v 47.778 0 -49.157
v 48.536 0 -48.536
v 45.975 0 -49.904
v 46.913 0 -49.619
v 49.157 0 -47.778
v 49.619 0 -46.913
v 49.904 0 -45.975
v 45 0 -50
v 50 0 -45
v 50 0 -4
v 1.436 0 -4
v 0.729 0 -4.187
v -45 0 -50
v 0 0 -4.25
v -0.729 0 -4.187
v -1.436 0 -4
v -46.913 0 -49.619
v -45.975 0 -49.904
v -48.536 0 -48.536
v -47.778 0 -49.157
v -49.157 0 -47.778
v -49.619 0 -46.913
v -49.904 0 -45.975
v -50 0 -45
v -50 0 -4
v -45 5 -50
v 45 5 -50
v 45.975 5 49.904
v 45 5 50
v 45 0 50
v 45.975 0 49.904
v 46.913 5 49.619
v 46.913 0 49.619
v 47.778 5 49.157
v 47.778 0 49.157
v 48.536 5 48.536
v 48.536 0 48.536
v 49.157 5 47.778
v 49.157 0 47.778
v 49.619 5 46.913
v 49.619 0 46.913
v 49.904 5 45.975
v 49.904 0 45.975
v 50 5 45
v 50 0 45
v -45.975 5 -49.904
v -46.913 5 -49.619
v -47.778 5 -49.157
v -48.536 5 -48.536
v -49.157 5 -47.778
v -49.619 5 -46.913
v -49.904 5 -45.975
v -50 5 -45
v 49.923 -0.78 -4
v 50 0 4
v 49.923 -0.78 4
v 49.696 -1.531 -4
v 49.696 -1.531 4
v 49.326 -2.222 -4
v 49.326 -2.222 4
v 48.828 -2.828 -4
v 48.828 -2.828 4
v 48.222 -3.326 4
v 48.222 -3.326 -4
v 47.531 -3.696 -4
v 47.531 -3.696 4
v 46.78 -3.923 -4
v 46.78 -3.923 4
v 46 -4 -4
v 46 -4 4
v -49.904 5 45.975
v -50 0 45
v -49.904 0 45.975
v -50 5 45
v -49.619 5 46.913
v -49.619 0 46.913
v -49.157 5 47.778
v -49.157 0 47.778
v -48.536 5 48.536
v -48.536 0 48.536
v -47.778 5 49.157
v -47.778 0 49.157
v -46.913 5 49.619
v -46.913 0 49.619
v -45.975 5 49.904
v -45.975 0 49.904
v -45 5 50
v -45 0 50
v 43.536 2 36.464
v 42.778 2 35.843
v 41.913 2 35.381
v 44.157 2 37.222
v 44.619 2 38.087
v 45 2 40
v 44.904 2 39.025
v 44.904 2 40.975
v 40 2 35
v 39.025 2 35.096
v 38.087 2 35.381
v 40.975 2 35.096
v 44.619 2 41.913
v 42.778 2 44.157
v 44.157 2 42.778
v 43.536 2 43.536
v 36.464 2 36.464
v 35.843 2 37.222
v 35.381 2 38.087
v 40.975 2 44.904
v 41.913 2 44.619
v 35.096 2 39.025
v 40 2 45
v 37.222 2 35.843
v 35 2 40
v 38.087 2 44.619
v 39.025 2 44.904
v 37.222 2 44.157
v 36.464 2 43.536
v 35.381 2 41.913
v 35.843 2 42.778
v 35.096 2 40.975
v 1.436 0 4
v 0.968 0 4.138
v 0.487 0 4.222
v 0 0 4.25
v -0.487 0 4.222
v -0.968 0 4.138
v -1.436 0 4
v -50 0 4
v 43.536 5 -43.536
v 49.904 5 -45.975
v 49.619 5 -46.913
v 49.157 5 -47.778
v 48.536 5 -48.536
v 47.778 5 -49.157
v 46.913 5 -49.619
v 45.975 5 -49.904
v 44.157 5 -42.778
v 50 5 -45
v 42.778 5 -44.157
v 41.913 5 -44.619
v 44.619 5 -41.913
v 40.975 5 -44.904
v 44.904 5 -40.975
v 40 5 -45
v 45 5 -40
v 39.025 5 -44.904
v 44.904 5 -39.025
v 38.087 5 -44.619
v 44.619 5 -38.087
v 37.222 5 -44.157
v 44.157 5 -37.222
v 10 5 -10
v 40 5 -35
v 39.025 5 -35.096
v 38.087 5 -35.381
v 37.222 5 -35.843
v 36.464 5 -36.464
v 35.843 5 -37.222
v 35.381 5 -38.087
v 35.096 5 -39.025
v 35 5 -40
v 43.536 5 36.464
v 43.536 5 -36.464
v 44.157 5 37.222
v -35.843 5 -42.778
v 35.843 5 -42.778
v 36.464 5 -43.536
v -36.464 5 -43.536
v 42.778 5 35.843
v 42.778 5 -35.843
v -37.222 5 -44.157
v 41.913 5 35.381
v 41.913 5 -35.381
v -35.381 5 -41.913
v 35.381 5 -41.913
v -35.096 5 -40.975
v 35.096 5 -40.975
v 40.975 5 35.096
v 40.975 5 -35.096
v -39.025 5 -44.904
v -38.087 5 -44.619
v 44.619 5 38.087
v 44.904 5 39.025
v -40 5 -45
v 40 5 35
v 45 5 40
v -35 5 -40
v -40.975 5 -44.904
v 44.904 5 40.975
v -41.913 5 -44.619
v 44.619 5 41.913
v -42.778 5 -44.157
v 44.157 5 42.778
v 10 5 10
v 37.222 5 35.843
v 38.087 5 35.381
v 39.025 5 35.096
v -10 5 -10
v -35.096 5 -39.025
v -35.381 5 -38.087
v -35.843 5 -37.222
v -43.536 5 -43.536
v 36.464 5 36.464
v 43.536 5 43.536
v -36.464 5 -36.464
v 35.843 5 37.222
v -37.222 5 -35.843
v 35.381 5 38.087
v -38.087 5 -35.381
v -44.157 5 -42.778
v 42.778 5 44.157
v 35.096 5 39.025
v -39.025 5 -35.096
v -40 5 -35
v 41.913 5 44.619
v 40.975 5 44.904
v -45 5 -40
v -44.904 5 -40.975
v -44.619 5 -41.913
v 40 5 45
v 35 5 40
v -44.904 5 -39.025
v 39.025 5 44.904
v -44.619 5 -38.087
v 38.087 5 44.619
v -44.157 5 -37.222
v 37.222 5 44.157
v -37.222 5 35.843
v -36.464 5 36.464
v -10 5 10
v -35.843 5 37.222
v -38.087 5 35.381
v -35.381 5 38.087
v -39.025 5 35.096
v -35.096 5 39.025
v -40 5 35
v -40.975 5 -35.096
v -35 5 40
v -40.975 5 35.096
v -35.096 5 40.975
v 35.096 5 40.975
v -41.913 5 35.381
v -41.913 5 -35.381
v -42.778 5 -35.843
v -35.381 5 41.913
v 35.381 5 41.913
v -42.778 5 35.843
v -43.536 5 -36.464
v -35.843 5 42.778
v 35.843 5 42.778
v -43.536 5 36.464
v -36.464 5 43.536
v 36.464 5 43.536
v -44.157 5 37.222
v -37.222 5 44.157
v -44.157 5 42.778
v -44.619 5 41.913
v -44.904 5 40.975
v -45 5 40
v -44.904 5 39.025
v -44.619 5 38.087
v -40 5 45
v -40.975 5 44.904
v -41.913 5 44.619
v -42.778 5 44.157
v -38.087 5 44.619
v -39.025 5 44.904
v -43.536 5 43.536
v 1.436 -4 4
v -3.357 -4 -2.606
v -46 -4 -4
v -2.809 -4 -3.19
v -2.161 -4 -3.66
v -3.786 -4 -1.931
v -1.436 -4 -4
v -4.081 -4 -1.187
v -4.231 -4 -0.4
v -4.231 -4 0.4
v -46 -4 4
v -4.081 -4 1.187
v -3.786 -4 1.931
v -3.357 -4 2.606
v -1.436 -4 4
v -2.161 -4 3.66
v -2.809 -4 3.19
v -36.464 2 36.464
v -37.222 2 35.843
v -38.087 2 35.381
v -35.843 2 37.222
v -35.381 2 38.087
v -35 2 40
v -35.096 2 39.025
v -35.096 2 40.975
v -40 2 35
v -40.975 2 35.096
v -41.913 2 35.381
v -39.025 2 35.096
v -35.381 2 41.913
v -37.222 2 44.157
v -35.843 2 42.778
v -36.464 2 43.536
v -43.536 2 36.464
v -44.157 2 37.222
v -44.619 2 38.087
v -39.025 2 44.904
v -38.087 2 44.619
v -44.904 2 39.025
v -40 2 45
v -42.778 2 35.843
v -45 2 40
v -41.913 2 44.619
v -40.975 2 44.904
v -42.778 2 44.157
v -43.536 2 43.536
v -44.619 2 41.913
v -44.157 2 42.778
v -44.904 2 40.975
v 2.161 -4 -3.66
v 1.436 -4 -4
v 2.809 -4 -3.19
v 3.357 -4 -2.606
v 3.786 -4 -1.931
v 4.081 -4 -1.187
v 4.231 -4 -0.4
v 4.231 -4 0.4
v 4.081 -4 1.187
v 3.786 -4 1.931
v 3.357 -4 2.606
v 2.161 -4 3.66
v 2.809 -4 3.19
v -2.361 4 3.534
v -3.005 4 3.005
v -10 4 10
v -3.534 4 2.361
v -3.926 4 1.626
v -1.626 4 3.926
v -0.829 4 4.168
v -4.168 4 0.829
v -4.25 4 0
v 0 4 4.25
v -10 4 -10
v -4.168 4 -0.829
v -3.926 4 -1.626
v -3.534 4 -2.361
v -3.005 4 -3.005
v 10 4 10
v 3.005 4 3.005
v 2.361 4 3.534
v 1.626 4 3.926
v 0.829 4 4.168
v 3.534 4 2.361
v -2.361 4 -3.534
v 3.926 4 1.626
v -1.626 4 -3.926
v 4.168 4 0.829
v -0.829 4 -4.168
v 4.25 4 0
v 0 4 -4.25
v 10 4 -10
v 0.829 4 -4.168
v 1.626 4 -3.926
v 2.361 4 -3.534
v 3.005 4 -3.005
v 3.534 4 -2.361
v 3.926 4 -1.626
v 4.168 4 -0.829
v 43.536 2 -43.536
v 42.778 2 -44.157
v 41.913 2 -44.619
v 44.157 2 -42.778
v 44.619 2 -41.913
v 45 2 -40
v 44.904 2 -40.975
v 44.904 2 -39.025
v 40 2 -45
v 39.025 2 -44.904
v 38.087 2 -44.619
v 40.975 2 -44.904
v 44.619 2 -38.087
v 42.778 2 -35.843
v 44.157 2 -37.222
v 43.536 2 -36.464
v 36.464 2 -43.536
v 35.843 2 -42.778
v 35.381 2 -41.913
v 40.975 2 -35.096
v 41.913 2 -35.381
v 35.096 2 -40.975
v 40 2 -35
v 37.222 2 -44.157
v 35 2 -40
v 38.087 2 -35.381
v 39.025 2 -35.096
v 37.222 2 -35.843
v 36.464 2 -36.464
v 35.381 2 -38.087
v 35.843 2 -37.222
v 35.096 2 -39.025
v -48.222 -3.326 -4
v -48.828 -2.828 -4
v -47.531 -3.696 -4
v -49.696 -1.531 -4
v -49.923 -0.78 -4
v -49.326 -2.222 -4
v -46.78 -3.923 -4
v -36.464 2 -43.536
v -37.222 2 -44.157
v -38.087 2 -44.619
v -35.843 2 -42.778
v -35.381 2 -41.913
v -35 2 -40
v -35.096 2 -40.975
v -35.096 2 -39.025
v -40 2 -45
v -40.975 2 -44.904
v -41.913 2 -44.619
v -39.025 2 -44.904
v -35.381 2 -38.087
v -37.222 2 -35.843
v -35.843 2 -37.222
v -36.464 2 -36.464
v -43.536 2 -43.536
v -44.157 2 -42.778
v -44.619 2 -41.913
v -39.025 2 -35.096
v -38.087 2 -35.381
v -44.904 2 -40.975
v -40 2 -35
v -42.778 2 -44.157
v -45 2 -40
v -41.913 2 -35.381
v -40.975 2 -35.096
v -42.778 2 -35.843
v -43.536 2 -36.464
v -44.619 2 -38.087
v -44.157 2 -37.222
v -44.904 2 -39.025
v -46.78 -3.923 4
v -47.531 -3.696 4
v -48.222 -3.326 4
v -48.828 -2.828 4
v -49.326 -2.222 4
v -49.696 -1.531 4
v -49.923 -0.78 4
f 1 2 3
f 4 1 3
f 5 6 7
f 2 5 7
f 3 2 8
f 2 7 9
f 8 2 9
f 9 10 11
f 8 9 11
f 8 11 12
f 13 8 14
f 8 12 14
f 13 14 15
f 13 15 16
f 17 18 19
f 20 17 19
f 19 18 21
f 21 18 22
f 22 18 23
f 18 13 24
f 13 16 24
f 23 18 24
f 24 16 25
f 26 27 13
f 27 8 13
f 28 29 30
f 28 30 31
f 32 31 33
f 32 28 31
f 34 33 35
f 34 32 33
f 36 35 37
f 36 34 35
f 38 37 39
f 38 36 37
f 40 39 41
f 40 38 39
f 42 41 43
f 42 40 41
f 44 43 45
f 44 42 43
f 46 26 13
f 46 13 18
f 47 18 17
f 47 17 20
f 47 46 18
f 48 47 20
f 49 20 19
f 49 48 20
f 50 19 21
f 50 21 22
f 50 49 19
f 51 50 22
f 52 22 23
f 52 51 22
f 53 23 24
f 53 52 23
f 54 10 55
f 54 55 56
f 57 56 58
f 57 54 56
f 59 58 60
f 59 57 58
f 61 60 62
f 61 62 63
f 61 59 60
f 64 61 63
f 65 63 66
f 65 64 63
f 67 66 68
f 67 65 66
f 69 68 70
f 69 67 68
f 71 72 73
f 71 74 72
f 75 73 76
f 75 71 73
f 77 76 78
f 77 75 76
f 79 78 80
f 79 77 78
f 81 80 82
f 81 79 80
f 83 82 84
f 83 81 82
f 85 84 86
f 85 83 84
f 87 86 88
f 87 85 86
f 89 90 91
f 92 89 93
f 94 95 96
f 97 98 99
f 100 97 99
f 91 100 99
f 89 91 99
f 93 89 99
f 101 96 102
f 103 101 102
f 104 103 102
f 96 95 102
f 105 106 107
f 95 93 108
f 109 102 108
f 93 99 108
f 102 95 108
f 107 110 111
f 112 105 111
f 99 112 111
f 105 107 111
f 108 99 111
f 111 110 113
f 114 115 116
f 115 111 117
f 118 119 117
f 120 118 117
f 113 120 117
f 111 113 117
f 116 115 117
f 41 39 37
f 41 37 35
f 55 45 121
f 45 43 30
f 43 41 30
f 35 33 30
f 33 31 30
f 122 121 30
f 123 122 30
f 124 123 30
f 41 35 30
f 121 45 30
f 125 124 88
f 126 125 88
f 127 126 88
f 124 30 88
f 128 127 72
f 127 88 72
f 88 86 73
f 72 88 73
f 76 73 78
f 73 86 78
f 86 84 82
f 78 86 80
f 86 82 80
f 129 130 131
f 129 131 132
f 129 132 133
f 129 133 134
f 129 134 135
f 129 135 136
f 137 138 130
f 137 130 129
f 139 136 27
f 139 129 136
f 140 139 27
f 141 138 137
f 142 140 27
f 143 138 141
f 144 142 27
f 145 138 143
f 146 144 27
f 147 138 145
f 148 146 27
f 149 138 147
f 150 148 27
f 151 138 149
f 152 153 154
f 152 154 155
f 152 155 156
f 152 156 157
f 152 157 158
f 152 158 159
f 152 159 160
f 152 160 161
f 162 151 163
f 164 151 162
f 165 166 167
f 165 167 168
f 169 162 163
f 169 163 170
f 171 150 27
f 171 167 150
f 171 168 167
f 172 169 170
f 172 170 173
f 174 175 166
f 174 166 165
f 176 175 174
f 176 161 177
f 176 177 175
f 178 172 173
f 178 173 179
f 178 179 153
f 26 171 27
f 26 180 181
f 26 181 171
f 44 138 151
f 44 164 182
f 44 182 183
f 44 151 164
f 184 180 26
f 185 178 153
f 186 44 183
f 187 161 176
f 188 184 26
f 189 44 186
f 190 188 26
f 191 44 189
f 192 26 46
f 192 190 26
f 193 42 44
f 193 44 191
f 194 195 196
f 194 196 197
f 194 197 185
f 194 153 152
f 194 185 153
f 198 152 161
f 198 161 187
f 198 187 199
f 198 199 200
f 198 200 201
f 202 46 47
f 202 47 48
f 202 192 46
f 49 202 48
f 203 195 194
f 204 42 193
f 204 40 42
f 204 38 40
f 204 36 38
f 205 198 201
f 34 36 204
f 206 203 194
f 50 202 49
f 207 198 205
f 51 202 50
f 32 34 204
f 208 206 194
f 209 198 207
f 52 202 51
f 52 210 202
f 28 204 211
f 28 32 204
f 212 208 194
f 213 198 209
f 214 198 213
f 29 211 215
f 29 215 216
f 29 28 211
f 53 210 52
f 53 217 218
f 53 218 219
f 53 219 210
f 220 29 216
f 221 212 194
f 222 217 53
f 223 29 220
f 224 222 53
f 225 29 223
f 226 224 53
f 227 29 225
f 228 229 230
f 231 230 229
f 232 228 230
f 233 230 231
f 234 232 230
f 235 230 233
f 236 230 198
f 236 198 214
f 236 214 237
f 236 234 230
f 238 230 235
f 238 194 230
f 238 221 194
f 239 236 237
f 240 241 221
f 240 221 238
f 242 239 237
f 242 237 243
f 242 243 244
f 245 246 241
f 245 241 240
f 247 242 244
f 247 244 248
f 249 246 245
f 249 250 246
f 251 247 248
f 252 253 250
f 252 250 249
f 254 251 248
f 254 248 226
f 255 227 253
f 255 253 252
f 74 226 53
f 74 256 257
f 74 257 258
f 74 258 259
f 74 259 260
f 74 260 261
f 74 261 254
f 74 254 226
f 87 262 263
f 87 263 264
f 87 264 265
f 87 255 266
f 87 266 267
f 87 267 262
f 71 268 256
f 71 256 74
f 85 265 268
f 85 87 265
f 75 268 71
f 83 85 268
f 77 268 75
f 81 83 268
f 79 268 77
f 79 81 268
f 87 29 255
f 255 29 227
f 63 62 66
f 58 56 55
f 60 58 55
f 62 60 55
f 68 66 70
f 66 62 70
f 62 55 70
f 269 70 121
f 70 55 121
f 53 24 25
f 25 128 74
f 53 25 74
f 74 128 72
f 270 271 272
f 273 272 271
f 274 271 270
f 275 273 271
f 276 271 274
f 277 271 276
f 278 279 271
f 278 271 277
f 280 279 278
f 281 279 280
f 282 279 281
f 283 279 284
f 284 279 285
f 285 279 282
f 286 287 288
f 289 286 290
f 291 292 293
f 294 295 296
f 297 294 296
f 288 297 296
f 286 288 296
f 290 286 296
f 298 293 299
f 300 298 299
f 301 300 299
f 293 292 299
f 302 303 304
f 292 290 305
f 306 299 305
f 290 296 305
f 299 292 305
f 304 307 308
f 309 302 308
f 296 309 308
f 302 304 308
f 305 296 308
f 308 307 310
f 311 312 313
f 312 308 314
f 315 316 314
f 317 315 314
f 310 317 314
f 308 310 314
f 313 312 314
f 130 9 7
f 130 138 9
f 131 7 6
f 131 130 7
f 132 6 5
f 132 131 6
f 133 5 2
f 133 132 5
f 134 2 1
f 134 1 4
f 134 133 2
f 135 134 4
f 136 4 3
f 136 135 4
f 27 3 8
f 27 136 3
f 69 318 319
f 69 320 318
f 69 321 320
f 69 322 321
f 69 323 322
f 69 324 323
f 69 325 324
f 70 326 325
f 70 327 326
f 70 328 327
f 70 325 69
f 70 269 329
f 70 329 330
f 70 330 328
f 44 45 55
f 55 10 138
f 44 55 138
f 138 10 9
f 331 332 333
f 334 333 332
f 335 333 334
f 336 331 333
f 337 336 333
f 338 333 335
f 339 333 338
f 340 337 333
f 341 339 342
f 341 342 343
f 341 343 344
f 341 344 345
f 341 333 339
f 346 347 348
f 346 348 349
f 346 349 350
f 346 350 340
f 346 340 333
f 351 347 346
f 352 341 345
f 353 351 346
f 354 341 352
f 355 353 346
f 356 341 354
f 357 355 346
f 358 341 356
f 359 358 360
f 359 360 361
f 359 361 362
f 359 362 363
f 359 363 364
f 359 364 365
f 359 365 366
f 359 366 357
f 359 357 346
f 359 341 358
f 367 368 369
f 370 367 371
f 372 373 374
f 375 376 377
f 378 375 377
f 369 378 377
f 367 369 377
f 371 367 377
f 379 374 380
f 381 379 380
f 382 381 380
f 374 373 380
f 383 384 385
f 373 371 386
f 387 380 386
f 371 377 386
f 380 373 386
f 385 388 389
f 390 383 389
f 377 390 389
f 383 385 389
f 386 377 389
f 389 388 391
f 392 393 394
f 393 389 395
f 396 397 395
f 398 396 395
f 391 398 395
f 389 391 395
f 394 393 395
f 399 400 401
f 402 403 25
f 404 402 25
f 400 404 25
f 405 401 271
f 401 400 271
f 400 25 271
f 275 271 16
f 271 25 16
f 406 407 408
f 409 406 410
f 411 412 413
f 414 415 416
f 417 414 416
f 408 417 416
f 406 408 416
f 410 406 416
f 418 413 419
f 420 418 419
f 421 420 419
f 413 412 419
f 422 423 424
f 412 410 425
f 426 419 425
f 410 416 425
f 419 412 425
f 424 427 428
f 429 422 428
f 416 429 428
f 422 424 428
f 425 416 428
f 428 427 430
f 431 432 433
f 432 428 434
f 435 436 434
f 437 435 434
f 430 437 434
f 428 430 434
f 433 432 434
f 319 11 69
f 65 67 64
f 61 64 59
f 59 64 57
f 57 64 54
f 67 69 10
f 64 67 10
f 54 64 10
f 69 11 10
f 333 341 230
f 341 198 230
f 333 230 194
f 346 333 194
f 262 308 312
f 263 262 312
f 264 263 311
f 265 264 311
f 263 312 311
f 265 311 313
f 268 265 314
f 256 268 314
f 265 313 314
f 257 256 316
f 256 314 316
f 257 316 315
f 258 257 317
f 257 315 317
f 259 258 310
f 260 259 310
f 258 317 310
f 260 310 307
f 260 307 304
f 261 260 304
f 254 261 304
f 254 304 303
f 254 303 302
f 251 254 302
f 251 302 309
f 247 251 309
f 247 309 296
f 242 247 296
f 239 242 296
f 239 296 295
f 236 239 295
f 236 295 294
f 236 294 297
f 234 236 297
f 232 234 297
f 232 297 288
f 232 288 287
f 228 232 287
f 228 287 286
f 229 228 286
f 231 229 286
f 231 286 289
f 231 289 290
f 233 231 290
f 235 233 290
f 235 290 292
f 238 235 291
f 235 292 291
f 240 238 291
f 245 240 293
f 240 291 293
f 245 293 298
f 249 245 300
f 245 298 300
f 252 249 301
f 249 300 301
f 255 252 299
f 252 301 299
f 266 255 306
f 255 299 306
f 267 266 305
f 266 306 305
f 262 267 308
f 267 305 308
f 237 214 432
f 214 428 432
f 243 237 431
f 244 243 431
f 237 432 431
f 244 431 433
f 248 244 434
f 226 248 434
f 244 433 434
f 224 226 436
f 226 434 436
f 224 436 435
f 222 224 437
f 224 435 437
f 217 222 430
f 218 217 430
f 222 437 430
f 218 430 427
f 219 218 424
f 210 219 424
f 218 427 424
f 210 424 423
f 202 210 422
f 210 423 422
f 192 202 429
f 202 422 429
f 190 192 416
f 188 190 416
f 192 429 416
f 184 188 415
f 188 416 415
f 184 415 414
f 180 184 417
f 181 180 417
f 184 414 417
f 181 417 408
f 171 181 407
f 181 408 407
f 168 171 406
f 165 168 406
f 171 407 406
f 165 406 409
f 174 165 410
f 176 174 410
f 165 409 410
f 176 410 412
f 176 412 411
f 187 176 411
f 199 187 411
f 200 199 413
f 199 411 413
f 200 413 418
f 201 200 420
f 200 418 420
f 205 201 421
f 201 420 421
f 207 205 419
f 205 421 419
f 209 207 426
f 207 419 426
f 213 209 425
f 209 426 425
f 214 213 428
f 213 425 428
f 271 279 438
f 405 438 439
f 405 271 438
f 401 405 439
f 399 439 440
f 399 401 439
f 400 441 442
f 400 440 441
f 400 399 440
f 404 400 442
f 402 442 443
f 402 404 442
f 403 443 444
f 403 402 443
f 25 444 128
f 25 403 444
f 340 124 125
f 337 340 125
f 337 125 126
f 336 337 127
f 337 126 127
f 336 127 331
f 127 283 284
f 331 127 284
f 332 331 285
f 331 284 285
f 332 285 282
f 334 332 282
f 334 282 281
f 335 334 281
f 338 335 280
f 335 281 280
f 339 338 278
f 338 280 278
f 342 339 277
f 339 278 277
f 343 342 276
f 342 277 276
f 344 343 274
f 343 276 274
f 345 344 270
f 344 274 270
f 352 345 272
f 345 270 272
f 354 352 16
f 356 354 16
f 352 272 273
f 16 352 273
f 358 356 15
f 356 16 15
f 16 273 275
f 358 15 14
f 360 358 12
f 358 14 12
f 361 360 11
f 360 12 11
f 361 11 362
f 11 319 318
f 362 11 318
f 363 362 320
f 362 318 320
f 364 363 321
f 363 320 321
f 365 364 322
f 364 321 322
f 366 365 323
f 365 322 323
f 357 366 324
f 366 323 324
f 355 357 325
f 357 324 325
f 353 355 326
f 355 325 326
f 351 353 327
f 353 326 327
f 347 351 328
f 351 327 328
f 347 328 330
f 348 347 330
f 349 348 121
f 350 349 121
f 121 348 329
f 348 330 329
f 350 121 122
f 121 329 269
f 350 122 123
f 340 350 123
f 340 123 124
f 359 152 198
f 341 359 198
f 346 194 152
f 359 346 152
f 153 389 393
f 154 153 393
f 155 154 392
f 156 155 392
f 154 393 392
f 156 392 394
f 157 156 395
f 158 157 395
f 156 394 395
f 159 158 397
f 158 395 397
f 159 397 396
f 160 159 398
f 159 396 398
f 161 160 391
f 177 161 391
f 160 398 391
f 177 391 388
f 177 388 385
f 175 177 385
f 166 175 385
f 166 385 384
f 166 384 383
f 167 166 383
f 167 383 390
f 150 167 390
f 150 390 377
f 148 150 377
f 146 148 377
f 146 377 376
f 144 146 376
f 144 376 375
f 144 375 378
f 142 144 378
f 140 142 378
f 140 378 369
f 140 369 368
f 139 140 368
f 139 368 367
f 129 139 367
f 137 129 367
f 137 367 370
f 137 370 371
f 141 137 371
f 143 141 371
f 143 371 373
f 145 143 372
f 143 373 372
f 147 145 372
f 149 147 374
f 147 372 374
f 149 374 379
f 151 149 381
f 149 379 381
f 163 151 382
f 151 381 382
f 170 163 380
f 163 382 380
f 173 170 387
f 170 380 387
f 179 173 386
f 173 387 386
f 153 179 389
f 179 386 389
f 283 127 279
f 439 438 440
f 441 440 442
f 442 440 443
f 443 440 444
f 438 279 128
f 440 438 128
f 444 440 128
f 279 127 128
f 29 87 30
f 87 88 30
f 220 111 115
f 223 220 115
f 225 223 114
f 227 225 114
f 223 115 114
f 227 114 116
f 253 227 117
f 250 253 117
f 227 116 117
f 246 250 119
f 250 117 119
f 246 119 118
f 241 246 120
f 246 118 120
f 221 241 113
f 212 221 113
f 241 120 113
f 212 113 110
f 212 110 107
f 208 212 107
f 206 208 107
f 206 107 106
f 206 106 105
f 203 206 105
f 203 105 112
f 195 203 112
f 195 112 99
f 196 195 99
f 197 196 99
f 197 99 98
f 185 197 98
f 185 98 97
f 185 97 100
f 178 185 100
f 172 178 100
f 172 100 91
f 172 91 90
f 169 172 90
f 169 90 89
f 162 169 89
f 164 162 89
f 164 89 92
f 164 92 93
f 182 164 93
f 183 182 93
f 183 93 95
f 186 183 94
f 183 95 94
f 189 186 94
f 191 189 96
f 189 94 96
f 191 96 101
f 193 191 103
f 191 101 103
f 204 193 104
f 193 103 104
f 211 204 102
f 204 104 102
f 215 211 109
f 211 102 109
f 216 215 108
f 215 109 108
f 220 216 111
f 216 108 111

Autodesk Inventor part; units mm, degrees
ref_plane "YZ Plane" through (0, 0, 0) normal (1, 0, 0) x (0, 1, 0)
ref_plane "XZ Plane" through (0, 0, 0) normal (0, 1, 0) x (-1, 0, 0)
ref_plane "XY Plane" through (0, 0, 0) normal (0, 0, 1) x (1, 0, 0)
sketch "Sketch1" plane through (0, 0, 0) normal (0, 1, 0) x (-1, 0, 0)
  line L0 (-50, -50) -> (50, -50)
  line L1 (50, -50) -> (50, 50)
  line L2 (50, 50) -> (-50, 50)
  line L3 (-50, 50) -> (-50, -50)
  line L4 (-50, -50) -> (50, 50) construction
  line L5 (50, -50) -> (-50, 50) construction
  point P0 (0, 0)
  dimension "d0" = 100
  dimension "d1" = 100
extrude "Extrusion1" add sketch "Sketch1" along normal blind 5
sketch "Sketch2" plane through (0, 0, 0) normal (0, -1, 0) x (1, 0, 0)
  line L0 (50, 50) -> (50, -50) projected
  line L1 (-50, -4) -> (50, -4)
  line L2 (50, -4) -> (50, 4)
  line L3 (50, 4) -> (-50, 4)
  line L4 (-50, 4) -> (-50, -4)
  line L5 (-50, -4) -> (50, 4) construction
  line L6 (50, -4) -> (-50, 4) construction
  point P0 (0, 0)
  dimension "d4" = 8
extrude "Extrusion2" add sketch "Sketch2" along normal blind 4
sketch "Sketch3" plane through (0, 5, 0) normal (0, 1, 0) x (1, 0, 0)
  point P0 (0, 0)
  point P1 (0, 0)
hole "Hole1" at (0, 5, 0) direction (0, -1, 0) diameter 8.5 depth 9
fillet "Fillet1" radius 5 4 edges at (50, 2.5, 50) (50, 2.5, -50) (-50, 2.5, 50) (-50, 2.5, -50)
sketch "Sketch7" plane through (0, 5, 0) normal (0, 1, 0) x (1, 0, 0)
  line L0 (40, -40) -> (-40, -40) construction
  line L1 (-40, -40) -> (-40, 40) construction
  line L2 (-40, 40) -> (40, 40) construction
  line L3 (40, 40) -> (40, -40) construction
  circle A0 centre (0, 0) radius 4.25 construction
  line L4 (40, -40) -> (-40, 40) construction
  line L5 (-40, -40) -> (40, 40) construction
  dimension "d27" = 80
  dimension "d28" = 80
hole "Hole2" at (-40, 5, 40) at (40, 5, -40) at (40, 5, 40) at (-40, 5, -40) direction (0, -1, 0) diameter 10 depth 3
fillet "Fillet2" radius 4 2 edges at (50, -4, 0) (-50, -4, 0)
sketch "Sketch9" plane through (0, 5, 0) normal (0, 1, 0) x (1, 0, 0)
  line L0 (10, 10) -> (-10, 10)
  line L1 (-10, 10) -> (-10, -10)
  line L2 (-10, -10) -> (10, -10)
  line L3 (10, -10) -> (10, 10)
  line L4 (10, 10) -> (-10, -10) construction
  line L5 (-10, 10) -> (10, -10) construction
  point P0 (0, 0)
  dimension "d38" = 20
  dimension "d39" = 20
extrude "Extrusion6" cut sketch "Sketch9" against normal blind 1
properties part number "sliding_platform_3DPrint"
